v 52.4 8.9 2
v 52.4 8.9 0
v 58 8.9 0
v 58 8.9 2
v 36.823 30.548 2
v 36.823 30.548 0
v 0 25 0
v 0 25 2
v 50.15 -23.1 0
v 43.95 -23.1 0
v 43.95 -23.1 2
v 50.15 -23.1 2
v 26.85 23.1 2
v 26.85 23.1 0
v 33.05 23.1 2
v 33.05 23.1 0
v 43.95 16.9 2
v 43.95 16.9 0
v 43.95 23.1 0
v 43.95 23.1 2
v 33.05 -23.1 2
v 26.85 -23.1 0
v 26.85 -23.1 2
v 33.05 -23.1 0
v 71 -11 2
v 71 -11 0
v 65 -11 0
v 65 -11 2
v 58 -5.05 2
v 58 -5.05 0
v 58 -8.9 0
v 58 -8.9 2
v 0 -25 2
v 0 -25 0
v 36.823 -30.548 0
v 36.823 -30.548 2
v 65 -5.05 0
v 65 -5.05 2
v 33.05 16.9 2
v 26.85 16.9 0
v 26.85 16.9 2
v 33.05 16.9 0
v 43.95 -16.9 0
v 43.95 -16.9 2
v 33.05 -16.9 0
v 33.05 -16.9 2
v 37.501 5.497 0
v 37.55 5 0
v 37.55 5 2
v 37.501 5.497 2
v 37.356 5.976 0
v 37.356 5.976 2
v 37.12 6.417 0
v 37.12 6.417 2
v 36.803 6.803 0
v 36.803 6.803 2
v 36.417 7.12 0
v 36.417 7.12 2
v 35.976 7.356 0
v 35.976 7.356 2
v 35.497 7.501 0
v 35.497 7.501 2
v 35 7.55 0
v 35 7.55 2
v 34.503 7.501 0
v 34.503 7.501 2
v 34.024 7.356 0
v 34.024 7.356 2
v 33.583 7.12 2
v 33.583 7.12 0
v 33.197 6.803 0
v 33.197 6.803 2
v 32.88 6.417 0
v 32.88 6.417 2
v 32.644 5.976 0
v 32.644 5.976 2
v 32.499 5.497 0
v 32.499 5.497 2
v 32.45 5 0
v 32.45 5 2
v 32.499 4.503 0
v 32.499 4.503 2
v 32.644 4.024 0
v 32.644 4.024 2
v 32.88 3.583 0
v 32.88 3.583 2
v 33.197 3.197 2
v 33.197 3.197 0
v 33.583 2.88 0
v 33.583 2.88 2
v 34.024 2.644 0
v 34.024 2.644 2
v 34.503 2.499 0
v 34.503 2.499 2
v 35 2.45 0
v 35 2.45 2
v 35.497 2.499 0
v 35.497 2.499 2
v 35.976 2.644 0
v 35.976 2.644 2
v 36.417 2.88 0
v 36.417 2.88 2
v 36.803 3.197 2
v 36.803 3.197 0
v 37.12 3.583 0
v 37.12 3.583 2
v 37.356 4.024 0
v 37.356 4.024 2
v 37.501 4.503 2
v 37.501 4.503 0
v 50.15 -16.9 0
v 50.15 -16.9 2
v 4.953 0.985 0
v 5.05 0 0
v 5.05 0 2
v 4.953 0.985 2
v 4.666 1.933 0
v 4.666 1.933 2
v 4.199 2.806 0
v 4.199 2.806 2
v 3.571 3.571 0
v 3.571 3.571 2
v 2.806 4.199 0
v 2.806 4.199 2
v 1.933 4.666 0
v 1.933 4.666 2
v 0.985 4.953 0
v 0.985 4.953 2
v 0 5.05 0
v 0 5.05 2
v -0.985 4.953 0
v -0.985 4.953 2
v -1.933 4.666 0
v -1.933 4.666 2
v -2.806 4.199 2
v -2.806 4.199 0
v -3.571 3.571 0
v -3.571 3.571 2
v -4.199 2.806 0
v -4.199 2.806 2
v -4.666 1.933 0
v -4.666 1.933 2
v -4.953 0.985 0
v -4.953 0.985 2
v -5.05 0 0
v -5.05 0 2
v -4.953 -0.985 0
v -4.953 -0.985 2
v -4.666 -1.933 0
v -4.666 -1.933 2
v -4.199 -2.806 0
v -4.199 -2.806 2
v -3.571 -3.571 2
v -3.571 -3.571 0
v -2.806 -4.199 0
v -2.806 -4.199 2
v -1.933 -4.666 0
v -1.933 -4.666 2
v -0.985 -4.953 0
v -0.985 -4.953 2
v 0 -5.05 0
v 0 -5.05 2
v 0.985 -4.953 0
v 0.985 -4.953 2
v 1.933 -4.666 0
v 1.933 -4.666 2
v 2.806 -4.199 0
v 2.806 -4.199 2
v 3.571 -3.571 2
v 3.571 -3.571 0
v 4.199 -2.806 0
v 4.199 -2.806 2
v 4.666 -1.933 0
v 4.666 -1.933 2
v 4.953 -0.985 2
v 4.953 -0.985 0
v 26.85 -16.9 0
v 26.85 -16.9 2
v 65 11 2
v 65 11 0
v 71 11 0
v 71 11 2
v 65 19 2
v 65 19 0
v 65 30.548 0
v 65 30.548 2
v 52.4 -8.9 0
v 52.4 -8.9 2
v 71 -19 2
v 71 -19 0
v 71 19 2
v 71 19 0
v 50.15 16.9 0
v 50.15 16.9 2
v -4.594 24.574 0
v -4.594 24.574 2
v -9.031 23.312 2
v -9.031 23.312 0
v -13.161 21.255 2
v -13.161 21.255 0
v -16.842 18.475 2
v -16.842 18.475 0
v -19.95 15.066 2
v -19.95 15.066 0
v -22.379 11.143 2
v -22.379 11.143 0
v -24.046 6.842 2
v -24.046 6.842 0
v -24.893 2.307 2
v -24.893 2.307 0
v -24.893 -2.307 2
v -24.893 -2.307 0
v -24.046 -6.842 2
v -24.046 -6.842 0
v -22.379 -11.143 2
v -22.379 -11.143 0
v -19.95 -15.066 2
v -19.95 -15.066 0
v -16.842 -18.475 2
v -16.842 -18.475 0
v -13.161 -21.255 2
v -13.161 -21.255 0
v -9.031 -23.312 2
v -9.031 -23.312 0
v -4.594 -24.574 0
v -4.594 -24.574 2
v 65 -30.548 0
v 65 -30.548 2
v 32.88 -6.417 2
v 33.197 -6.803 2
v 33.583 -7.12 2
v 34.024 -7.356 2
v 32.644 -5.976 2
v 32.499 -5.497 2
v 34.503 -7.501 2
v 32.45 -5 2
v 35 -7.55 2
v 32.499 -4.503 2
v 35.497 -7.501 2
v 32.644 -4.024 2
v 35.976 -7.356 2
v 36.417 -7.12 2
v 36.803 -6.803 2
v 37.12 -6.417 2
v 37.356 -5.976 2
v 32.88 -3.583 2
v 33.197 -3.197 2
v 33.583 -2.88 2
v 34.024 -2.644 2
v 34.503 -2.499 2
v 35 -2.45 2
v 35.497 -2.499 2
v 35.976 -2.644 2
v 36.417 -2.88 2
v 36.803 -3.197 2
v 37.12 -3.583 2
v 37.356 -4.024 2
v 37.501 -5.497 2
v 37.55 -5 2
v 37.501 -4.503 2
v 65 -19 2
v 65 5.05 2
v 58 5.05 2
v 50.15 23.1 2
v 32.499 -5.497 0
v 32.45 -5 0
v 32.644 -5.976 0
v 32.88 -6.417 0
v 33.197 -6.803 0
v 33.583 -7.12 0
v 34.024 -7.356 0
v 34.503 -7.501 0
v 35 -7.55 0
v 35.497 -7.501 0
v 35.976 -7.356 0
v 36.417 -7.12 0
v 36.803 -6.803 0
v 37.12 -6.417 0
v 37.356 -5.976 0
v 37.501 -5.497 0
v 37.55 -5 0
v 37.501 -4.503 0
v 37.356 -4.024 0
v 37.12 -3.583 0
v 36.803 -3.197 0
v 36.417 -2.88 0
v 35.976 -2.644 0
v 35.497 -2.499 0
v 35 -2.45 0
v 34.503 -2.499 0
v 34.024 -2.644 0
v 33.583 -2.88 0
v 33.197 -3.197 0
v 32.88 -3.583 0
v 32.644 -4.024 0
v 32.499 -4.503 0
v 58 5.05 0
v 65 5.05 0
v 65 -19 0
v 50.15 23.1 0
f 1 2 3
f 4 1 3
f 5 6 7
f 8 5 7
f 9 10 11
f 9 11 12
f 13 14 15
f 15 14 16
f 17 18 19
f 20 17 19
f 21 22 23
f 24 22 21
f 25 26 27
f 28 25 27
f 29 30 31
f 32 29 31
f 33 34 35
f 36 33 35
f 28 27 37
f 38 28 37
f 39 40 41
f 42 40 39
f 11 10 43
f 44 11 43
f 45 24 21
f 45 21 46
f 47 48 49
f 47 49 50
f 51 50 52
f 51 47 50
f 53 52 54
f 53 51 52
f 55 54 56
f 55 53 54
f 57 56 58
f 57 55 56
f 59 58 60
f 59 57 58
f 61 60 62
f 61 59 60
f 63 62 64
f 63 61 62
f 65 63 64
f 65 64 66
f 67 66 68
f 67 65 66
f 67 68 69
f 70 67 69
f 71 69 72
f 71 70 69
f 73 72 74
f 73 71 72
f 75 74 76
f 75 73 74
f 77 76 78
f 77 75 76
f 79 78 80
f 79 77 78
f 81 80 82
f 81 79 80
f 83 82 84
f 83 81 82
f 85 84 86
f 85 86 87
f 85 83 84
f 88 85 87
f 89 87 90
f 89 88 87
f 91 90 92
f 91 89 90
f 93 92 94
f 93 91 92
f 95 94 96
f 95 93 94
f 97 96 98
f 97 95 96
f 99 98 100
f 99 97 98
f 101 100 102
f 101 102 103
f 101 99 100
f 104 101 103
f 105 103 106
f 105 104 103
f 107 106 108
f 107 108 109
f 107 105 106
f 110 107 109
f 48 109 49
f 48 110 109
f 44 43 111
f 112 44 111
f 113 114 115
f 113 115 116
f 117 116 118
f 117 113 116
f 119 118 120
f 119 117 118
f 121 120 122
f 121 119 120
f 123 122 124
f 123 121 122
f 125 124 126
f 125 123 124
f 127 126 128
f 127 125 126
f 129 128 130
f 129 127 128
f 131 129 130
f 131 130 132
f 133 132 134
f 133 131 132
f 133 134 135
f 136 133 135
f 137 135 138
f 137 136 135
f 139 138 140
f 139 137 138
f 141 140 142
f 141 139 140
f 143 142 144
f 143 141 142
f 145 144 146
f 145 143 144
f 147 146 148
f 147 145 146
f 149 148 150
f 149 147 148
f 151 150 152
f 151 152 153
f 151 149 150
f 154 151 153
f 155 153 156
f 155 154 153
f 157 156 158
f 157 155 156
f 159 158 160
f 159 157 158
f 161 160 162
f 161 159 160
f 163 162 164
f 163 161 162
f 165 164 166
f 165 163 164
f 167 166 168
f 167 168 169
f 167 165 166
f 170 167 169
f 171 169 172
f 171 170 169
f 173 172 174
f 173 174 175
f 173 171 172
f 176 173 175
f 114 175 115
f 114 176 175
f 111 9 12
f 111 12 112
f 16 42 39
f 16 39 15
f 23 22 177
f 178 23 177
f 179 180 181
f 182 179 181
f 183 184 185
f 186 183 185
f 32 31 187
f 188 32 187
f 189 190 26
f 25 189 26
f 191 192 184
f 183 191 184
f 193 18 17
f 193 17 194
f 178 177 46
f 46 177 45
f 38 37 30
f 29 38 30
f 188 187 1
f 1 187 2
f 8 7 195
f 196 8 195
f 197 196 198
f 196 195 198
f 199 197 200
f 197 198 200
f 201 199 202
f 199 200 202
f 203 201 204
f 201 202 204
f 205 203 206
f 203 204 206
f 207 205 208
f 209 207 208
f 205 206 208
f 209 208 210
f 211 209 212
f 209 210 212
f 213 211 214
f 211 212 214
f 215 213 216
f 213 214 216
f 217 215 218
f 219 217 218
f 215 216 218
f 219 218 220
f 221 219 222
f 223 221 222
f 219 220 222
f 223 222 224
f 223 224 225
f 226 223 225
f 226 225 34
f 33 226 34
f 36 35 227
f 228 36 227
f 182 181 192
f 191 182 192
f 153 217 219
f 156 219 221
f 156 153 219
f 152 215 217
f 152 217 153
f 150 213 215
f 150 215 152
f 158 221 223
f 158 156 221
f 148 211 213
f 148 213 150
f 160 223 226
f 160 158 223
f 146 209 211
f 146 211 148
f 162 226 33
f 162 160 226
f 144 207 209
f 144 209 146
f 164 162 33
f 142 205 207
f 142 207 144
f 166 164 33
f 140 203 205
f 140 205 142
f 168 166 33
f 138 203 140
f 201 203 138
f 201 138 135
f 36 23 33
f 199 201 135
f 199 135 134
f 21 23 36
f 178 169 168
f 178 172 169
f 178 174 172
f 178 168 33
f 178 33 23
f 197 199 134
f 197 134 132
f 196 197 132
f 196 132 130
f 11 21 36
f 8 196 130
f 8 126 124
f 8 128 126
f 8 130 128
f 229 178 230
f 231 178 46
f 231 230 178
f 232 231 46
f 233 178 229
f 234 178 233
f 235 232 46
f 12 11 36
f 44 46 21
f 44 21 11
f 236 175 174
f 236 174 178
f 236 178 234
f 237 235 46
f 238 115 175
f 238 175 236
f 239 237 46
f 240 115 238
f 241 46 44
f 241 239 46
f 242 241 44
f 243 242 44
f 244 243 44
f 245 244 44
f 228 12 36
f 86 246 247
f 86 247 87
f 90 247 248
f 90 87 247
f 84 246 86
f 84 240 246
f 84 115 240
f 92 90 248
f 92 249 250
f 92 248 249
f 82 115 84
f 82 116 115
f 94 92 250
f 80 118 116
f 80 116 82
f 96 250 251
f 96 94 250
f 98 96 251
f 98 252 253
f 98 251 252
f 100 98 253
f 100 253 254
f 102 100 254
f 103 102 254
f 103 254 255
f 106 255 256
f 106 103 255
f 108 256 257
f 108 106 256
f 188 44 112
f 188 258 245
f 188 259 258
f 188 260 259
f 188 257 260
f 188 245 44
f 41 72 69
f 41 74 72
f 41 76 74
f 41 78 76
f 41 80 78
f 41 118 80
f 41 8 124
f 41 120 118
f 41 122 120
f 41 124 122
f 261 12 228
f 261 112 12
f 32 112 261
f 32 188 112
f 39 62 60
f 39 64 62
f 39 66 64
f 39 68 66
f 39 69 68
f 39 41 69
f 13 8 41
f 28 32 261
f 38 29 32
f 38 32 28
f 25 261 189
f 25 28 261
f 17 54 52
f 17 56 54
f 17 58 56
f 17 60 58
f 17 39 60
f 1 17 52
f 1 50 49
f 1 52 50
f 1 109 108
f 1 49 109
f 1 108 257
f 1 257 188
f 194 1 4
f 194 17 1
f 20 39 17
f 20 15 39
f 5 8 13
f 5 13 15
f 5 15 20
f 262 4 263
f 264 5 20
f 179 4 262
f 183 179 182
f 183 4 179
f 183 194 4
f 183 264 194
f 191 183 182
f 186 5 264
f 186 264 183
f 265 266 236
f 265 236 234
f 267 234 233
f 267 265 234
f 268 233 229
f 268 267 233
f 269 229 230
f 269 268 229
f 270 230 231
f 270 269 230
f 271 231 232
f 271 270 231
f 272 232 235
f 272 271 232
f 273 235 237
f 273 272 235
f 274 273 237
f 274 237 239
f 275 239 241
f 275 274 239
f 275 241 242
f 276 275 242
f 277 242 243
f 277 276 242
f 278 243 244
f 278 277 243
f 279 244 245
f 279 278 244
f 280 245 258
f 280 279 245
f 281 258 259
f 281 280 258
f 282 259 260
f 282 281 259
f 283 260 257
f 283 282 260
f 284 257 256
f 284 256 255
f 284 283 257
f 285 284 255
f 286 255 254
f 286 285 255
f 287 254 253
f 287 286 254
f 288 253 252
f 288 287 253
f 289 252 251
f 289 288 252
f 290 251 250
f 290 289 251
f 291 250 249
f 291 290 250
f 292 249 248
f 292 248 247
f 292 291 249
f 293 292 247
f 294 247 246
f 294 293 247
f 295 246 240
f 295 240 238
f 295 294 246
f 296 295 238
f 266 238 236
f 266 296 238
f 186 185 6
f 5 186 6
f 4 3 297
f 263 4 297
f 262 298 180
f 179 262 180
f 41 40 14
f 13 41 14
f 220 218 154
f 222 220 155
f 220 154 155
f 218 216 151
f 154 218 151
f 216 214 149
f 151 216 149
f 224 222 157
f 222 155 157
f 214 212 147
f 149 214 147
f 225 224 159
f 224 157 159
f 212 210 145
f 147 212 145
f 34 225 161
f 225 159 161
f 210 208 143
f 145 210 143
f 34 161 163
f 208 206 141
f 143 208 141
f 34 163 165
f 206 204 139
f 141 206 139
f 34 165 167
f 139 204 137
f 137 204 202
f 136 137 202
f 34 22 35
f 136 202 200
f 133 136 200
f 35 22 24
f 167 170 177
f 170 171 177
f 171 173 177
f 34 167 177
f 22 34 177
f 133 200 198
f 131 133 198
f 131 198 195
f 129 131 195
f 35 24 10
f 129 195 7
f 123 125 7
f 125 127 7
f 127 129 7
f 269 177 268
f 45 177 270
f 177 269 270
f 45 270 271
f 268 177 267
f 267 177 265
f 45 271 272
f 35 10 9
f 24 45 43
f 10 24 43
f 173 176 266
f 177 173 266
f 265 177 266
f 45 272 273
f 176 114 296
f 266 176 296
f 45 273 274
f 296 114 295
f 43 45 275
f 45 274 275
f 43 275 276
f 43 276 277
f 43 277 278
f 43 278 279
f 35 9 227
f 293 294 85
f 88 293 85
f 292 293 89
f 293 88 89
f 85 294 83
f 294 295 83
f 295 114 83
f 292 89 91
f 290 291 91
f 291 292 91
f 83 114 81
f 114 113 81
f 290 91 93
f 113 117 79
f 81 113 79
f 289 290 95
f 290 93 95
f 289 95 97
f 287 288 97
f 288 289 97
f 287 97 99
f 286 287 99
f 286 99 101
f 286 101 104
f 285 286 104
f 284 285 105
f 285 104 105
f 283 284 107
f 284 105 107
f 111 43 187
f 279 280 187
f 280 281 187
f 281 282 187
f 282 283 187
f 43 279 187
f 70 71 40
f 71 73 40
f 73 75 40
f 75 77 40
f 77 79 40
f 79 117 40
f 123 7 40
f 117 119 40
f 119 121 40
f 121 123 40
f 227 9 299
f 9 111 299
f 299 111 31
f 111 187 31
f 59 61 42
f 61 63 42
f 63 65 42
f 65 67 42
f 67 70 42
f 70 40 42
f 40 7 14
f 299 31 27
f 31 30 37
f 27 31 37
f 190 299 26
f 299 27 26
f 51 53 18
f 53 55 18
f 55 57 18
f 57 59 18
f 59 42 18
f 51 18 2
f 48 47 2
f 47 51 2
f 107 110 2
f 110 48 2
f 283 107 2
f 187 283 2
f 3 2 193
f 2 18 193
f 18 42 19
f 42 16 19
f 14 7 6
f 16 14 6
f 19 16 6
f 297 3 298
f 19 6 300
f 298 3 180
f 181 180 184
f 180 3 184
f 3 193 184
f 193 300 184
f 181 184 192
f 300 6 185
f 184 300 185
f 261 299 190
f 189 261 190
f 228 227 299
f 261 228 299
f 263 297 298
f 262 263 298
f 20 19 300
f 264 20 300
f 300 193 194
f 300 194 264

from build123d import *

# Parameters (mm, degrees)
SKETCH_1_R      = 5.05
SKETCH_1_R_2    = 2.55
SKETCH_1_W      = 6.2
SKETCH_1_H      = 6.2
EXTRUDE_1_DEPTH = 2


with BuildPart() as part:
    # 草图1 → 凸台-拉伸1 (new body)
    with BuildSketch(Plane.XY):
        with BuildLine():
            Line((0, -25), (36.822908512, -30.548036369))
            Line((36.822908512, -30.548036369), (65, -30.548036369))
            Line((65, -30.548036369), (65, -19))
            Line((65, -19), (71, -19))
            Line((71, -19), (71, -11))
            Line((71, -11), (65, -11))
            Line((65, -11), (65, -5.05))
            Line((65, -5.05), (58, -5.05))
            Line((58, -5.05), (58, -8.9))
            Line((58, -8.9), (52.4, -8.9))
            Line((52.4, -8.9), (52.4, -5.15))
            Line((52.4, -5.15), (52.4, 5.15))
            Line((52.4, 5.15), (52.4, 8.9))
            Line((52.4, 8.9), (58, 8.9))
            Line((58, 8.9), (58, 5.05))
            Line((58, 5.05), (65, 5.05))
            Line((65, 5.05), (65, 11))
            Line((65, 11), (71, 11))
            Line((71, 11), (71, 19))
            Line((71, 19), (65, 19))
            Line((65, 19), (65, 30.548036369))
            Line((65, 30.548036369), (36.822908512, 30.548036369))
            Line((36.822908512, 30.548036369), (0, 25))
            ThreePointArc((0, 25), (-25, 0), (0, -25))
        make_face()
        Circle(SKETCH_1_R, mode=Mode.SUBTRACT)
        with Locations((35, 5)):
            Circle(SKETCH_1_R_2, mode=Mode.SUBTRACT)
        with Locations(Location((35, -5, 0), (0, 0, 180))):
            Circle(SKETCH_1_R_2, mode=Mode.SUBTRACT)
        with Locations((47.05, -20)):
            Rectangle(SKETCH_1_W, SKETCH_1_H, mode=Mode.SUBTRACT)
        with Locations((29.95, -20)):
            Rectangle(SKETCH_1_W, SKETCH_1_H, mode=Mode.SUBTRACT)
        with Locations((29.95, 20)):
            Rectangle(SKETCH_1_W, SKETCH_1_H, mode=Mode.SUBTRACT)
        with Locations((47.05, 20)):
            Rectangle(SKETCH_1_W, SKETCH_1_H, mode=Mode.SUBTRACT)
    extrude(amount=EXTRUDE_1_DEPTH)


solid = part.part
